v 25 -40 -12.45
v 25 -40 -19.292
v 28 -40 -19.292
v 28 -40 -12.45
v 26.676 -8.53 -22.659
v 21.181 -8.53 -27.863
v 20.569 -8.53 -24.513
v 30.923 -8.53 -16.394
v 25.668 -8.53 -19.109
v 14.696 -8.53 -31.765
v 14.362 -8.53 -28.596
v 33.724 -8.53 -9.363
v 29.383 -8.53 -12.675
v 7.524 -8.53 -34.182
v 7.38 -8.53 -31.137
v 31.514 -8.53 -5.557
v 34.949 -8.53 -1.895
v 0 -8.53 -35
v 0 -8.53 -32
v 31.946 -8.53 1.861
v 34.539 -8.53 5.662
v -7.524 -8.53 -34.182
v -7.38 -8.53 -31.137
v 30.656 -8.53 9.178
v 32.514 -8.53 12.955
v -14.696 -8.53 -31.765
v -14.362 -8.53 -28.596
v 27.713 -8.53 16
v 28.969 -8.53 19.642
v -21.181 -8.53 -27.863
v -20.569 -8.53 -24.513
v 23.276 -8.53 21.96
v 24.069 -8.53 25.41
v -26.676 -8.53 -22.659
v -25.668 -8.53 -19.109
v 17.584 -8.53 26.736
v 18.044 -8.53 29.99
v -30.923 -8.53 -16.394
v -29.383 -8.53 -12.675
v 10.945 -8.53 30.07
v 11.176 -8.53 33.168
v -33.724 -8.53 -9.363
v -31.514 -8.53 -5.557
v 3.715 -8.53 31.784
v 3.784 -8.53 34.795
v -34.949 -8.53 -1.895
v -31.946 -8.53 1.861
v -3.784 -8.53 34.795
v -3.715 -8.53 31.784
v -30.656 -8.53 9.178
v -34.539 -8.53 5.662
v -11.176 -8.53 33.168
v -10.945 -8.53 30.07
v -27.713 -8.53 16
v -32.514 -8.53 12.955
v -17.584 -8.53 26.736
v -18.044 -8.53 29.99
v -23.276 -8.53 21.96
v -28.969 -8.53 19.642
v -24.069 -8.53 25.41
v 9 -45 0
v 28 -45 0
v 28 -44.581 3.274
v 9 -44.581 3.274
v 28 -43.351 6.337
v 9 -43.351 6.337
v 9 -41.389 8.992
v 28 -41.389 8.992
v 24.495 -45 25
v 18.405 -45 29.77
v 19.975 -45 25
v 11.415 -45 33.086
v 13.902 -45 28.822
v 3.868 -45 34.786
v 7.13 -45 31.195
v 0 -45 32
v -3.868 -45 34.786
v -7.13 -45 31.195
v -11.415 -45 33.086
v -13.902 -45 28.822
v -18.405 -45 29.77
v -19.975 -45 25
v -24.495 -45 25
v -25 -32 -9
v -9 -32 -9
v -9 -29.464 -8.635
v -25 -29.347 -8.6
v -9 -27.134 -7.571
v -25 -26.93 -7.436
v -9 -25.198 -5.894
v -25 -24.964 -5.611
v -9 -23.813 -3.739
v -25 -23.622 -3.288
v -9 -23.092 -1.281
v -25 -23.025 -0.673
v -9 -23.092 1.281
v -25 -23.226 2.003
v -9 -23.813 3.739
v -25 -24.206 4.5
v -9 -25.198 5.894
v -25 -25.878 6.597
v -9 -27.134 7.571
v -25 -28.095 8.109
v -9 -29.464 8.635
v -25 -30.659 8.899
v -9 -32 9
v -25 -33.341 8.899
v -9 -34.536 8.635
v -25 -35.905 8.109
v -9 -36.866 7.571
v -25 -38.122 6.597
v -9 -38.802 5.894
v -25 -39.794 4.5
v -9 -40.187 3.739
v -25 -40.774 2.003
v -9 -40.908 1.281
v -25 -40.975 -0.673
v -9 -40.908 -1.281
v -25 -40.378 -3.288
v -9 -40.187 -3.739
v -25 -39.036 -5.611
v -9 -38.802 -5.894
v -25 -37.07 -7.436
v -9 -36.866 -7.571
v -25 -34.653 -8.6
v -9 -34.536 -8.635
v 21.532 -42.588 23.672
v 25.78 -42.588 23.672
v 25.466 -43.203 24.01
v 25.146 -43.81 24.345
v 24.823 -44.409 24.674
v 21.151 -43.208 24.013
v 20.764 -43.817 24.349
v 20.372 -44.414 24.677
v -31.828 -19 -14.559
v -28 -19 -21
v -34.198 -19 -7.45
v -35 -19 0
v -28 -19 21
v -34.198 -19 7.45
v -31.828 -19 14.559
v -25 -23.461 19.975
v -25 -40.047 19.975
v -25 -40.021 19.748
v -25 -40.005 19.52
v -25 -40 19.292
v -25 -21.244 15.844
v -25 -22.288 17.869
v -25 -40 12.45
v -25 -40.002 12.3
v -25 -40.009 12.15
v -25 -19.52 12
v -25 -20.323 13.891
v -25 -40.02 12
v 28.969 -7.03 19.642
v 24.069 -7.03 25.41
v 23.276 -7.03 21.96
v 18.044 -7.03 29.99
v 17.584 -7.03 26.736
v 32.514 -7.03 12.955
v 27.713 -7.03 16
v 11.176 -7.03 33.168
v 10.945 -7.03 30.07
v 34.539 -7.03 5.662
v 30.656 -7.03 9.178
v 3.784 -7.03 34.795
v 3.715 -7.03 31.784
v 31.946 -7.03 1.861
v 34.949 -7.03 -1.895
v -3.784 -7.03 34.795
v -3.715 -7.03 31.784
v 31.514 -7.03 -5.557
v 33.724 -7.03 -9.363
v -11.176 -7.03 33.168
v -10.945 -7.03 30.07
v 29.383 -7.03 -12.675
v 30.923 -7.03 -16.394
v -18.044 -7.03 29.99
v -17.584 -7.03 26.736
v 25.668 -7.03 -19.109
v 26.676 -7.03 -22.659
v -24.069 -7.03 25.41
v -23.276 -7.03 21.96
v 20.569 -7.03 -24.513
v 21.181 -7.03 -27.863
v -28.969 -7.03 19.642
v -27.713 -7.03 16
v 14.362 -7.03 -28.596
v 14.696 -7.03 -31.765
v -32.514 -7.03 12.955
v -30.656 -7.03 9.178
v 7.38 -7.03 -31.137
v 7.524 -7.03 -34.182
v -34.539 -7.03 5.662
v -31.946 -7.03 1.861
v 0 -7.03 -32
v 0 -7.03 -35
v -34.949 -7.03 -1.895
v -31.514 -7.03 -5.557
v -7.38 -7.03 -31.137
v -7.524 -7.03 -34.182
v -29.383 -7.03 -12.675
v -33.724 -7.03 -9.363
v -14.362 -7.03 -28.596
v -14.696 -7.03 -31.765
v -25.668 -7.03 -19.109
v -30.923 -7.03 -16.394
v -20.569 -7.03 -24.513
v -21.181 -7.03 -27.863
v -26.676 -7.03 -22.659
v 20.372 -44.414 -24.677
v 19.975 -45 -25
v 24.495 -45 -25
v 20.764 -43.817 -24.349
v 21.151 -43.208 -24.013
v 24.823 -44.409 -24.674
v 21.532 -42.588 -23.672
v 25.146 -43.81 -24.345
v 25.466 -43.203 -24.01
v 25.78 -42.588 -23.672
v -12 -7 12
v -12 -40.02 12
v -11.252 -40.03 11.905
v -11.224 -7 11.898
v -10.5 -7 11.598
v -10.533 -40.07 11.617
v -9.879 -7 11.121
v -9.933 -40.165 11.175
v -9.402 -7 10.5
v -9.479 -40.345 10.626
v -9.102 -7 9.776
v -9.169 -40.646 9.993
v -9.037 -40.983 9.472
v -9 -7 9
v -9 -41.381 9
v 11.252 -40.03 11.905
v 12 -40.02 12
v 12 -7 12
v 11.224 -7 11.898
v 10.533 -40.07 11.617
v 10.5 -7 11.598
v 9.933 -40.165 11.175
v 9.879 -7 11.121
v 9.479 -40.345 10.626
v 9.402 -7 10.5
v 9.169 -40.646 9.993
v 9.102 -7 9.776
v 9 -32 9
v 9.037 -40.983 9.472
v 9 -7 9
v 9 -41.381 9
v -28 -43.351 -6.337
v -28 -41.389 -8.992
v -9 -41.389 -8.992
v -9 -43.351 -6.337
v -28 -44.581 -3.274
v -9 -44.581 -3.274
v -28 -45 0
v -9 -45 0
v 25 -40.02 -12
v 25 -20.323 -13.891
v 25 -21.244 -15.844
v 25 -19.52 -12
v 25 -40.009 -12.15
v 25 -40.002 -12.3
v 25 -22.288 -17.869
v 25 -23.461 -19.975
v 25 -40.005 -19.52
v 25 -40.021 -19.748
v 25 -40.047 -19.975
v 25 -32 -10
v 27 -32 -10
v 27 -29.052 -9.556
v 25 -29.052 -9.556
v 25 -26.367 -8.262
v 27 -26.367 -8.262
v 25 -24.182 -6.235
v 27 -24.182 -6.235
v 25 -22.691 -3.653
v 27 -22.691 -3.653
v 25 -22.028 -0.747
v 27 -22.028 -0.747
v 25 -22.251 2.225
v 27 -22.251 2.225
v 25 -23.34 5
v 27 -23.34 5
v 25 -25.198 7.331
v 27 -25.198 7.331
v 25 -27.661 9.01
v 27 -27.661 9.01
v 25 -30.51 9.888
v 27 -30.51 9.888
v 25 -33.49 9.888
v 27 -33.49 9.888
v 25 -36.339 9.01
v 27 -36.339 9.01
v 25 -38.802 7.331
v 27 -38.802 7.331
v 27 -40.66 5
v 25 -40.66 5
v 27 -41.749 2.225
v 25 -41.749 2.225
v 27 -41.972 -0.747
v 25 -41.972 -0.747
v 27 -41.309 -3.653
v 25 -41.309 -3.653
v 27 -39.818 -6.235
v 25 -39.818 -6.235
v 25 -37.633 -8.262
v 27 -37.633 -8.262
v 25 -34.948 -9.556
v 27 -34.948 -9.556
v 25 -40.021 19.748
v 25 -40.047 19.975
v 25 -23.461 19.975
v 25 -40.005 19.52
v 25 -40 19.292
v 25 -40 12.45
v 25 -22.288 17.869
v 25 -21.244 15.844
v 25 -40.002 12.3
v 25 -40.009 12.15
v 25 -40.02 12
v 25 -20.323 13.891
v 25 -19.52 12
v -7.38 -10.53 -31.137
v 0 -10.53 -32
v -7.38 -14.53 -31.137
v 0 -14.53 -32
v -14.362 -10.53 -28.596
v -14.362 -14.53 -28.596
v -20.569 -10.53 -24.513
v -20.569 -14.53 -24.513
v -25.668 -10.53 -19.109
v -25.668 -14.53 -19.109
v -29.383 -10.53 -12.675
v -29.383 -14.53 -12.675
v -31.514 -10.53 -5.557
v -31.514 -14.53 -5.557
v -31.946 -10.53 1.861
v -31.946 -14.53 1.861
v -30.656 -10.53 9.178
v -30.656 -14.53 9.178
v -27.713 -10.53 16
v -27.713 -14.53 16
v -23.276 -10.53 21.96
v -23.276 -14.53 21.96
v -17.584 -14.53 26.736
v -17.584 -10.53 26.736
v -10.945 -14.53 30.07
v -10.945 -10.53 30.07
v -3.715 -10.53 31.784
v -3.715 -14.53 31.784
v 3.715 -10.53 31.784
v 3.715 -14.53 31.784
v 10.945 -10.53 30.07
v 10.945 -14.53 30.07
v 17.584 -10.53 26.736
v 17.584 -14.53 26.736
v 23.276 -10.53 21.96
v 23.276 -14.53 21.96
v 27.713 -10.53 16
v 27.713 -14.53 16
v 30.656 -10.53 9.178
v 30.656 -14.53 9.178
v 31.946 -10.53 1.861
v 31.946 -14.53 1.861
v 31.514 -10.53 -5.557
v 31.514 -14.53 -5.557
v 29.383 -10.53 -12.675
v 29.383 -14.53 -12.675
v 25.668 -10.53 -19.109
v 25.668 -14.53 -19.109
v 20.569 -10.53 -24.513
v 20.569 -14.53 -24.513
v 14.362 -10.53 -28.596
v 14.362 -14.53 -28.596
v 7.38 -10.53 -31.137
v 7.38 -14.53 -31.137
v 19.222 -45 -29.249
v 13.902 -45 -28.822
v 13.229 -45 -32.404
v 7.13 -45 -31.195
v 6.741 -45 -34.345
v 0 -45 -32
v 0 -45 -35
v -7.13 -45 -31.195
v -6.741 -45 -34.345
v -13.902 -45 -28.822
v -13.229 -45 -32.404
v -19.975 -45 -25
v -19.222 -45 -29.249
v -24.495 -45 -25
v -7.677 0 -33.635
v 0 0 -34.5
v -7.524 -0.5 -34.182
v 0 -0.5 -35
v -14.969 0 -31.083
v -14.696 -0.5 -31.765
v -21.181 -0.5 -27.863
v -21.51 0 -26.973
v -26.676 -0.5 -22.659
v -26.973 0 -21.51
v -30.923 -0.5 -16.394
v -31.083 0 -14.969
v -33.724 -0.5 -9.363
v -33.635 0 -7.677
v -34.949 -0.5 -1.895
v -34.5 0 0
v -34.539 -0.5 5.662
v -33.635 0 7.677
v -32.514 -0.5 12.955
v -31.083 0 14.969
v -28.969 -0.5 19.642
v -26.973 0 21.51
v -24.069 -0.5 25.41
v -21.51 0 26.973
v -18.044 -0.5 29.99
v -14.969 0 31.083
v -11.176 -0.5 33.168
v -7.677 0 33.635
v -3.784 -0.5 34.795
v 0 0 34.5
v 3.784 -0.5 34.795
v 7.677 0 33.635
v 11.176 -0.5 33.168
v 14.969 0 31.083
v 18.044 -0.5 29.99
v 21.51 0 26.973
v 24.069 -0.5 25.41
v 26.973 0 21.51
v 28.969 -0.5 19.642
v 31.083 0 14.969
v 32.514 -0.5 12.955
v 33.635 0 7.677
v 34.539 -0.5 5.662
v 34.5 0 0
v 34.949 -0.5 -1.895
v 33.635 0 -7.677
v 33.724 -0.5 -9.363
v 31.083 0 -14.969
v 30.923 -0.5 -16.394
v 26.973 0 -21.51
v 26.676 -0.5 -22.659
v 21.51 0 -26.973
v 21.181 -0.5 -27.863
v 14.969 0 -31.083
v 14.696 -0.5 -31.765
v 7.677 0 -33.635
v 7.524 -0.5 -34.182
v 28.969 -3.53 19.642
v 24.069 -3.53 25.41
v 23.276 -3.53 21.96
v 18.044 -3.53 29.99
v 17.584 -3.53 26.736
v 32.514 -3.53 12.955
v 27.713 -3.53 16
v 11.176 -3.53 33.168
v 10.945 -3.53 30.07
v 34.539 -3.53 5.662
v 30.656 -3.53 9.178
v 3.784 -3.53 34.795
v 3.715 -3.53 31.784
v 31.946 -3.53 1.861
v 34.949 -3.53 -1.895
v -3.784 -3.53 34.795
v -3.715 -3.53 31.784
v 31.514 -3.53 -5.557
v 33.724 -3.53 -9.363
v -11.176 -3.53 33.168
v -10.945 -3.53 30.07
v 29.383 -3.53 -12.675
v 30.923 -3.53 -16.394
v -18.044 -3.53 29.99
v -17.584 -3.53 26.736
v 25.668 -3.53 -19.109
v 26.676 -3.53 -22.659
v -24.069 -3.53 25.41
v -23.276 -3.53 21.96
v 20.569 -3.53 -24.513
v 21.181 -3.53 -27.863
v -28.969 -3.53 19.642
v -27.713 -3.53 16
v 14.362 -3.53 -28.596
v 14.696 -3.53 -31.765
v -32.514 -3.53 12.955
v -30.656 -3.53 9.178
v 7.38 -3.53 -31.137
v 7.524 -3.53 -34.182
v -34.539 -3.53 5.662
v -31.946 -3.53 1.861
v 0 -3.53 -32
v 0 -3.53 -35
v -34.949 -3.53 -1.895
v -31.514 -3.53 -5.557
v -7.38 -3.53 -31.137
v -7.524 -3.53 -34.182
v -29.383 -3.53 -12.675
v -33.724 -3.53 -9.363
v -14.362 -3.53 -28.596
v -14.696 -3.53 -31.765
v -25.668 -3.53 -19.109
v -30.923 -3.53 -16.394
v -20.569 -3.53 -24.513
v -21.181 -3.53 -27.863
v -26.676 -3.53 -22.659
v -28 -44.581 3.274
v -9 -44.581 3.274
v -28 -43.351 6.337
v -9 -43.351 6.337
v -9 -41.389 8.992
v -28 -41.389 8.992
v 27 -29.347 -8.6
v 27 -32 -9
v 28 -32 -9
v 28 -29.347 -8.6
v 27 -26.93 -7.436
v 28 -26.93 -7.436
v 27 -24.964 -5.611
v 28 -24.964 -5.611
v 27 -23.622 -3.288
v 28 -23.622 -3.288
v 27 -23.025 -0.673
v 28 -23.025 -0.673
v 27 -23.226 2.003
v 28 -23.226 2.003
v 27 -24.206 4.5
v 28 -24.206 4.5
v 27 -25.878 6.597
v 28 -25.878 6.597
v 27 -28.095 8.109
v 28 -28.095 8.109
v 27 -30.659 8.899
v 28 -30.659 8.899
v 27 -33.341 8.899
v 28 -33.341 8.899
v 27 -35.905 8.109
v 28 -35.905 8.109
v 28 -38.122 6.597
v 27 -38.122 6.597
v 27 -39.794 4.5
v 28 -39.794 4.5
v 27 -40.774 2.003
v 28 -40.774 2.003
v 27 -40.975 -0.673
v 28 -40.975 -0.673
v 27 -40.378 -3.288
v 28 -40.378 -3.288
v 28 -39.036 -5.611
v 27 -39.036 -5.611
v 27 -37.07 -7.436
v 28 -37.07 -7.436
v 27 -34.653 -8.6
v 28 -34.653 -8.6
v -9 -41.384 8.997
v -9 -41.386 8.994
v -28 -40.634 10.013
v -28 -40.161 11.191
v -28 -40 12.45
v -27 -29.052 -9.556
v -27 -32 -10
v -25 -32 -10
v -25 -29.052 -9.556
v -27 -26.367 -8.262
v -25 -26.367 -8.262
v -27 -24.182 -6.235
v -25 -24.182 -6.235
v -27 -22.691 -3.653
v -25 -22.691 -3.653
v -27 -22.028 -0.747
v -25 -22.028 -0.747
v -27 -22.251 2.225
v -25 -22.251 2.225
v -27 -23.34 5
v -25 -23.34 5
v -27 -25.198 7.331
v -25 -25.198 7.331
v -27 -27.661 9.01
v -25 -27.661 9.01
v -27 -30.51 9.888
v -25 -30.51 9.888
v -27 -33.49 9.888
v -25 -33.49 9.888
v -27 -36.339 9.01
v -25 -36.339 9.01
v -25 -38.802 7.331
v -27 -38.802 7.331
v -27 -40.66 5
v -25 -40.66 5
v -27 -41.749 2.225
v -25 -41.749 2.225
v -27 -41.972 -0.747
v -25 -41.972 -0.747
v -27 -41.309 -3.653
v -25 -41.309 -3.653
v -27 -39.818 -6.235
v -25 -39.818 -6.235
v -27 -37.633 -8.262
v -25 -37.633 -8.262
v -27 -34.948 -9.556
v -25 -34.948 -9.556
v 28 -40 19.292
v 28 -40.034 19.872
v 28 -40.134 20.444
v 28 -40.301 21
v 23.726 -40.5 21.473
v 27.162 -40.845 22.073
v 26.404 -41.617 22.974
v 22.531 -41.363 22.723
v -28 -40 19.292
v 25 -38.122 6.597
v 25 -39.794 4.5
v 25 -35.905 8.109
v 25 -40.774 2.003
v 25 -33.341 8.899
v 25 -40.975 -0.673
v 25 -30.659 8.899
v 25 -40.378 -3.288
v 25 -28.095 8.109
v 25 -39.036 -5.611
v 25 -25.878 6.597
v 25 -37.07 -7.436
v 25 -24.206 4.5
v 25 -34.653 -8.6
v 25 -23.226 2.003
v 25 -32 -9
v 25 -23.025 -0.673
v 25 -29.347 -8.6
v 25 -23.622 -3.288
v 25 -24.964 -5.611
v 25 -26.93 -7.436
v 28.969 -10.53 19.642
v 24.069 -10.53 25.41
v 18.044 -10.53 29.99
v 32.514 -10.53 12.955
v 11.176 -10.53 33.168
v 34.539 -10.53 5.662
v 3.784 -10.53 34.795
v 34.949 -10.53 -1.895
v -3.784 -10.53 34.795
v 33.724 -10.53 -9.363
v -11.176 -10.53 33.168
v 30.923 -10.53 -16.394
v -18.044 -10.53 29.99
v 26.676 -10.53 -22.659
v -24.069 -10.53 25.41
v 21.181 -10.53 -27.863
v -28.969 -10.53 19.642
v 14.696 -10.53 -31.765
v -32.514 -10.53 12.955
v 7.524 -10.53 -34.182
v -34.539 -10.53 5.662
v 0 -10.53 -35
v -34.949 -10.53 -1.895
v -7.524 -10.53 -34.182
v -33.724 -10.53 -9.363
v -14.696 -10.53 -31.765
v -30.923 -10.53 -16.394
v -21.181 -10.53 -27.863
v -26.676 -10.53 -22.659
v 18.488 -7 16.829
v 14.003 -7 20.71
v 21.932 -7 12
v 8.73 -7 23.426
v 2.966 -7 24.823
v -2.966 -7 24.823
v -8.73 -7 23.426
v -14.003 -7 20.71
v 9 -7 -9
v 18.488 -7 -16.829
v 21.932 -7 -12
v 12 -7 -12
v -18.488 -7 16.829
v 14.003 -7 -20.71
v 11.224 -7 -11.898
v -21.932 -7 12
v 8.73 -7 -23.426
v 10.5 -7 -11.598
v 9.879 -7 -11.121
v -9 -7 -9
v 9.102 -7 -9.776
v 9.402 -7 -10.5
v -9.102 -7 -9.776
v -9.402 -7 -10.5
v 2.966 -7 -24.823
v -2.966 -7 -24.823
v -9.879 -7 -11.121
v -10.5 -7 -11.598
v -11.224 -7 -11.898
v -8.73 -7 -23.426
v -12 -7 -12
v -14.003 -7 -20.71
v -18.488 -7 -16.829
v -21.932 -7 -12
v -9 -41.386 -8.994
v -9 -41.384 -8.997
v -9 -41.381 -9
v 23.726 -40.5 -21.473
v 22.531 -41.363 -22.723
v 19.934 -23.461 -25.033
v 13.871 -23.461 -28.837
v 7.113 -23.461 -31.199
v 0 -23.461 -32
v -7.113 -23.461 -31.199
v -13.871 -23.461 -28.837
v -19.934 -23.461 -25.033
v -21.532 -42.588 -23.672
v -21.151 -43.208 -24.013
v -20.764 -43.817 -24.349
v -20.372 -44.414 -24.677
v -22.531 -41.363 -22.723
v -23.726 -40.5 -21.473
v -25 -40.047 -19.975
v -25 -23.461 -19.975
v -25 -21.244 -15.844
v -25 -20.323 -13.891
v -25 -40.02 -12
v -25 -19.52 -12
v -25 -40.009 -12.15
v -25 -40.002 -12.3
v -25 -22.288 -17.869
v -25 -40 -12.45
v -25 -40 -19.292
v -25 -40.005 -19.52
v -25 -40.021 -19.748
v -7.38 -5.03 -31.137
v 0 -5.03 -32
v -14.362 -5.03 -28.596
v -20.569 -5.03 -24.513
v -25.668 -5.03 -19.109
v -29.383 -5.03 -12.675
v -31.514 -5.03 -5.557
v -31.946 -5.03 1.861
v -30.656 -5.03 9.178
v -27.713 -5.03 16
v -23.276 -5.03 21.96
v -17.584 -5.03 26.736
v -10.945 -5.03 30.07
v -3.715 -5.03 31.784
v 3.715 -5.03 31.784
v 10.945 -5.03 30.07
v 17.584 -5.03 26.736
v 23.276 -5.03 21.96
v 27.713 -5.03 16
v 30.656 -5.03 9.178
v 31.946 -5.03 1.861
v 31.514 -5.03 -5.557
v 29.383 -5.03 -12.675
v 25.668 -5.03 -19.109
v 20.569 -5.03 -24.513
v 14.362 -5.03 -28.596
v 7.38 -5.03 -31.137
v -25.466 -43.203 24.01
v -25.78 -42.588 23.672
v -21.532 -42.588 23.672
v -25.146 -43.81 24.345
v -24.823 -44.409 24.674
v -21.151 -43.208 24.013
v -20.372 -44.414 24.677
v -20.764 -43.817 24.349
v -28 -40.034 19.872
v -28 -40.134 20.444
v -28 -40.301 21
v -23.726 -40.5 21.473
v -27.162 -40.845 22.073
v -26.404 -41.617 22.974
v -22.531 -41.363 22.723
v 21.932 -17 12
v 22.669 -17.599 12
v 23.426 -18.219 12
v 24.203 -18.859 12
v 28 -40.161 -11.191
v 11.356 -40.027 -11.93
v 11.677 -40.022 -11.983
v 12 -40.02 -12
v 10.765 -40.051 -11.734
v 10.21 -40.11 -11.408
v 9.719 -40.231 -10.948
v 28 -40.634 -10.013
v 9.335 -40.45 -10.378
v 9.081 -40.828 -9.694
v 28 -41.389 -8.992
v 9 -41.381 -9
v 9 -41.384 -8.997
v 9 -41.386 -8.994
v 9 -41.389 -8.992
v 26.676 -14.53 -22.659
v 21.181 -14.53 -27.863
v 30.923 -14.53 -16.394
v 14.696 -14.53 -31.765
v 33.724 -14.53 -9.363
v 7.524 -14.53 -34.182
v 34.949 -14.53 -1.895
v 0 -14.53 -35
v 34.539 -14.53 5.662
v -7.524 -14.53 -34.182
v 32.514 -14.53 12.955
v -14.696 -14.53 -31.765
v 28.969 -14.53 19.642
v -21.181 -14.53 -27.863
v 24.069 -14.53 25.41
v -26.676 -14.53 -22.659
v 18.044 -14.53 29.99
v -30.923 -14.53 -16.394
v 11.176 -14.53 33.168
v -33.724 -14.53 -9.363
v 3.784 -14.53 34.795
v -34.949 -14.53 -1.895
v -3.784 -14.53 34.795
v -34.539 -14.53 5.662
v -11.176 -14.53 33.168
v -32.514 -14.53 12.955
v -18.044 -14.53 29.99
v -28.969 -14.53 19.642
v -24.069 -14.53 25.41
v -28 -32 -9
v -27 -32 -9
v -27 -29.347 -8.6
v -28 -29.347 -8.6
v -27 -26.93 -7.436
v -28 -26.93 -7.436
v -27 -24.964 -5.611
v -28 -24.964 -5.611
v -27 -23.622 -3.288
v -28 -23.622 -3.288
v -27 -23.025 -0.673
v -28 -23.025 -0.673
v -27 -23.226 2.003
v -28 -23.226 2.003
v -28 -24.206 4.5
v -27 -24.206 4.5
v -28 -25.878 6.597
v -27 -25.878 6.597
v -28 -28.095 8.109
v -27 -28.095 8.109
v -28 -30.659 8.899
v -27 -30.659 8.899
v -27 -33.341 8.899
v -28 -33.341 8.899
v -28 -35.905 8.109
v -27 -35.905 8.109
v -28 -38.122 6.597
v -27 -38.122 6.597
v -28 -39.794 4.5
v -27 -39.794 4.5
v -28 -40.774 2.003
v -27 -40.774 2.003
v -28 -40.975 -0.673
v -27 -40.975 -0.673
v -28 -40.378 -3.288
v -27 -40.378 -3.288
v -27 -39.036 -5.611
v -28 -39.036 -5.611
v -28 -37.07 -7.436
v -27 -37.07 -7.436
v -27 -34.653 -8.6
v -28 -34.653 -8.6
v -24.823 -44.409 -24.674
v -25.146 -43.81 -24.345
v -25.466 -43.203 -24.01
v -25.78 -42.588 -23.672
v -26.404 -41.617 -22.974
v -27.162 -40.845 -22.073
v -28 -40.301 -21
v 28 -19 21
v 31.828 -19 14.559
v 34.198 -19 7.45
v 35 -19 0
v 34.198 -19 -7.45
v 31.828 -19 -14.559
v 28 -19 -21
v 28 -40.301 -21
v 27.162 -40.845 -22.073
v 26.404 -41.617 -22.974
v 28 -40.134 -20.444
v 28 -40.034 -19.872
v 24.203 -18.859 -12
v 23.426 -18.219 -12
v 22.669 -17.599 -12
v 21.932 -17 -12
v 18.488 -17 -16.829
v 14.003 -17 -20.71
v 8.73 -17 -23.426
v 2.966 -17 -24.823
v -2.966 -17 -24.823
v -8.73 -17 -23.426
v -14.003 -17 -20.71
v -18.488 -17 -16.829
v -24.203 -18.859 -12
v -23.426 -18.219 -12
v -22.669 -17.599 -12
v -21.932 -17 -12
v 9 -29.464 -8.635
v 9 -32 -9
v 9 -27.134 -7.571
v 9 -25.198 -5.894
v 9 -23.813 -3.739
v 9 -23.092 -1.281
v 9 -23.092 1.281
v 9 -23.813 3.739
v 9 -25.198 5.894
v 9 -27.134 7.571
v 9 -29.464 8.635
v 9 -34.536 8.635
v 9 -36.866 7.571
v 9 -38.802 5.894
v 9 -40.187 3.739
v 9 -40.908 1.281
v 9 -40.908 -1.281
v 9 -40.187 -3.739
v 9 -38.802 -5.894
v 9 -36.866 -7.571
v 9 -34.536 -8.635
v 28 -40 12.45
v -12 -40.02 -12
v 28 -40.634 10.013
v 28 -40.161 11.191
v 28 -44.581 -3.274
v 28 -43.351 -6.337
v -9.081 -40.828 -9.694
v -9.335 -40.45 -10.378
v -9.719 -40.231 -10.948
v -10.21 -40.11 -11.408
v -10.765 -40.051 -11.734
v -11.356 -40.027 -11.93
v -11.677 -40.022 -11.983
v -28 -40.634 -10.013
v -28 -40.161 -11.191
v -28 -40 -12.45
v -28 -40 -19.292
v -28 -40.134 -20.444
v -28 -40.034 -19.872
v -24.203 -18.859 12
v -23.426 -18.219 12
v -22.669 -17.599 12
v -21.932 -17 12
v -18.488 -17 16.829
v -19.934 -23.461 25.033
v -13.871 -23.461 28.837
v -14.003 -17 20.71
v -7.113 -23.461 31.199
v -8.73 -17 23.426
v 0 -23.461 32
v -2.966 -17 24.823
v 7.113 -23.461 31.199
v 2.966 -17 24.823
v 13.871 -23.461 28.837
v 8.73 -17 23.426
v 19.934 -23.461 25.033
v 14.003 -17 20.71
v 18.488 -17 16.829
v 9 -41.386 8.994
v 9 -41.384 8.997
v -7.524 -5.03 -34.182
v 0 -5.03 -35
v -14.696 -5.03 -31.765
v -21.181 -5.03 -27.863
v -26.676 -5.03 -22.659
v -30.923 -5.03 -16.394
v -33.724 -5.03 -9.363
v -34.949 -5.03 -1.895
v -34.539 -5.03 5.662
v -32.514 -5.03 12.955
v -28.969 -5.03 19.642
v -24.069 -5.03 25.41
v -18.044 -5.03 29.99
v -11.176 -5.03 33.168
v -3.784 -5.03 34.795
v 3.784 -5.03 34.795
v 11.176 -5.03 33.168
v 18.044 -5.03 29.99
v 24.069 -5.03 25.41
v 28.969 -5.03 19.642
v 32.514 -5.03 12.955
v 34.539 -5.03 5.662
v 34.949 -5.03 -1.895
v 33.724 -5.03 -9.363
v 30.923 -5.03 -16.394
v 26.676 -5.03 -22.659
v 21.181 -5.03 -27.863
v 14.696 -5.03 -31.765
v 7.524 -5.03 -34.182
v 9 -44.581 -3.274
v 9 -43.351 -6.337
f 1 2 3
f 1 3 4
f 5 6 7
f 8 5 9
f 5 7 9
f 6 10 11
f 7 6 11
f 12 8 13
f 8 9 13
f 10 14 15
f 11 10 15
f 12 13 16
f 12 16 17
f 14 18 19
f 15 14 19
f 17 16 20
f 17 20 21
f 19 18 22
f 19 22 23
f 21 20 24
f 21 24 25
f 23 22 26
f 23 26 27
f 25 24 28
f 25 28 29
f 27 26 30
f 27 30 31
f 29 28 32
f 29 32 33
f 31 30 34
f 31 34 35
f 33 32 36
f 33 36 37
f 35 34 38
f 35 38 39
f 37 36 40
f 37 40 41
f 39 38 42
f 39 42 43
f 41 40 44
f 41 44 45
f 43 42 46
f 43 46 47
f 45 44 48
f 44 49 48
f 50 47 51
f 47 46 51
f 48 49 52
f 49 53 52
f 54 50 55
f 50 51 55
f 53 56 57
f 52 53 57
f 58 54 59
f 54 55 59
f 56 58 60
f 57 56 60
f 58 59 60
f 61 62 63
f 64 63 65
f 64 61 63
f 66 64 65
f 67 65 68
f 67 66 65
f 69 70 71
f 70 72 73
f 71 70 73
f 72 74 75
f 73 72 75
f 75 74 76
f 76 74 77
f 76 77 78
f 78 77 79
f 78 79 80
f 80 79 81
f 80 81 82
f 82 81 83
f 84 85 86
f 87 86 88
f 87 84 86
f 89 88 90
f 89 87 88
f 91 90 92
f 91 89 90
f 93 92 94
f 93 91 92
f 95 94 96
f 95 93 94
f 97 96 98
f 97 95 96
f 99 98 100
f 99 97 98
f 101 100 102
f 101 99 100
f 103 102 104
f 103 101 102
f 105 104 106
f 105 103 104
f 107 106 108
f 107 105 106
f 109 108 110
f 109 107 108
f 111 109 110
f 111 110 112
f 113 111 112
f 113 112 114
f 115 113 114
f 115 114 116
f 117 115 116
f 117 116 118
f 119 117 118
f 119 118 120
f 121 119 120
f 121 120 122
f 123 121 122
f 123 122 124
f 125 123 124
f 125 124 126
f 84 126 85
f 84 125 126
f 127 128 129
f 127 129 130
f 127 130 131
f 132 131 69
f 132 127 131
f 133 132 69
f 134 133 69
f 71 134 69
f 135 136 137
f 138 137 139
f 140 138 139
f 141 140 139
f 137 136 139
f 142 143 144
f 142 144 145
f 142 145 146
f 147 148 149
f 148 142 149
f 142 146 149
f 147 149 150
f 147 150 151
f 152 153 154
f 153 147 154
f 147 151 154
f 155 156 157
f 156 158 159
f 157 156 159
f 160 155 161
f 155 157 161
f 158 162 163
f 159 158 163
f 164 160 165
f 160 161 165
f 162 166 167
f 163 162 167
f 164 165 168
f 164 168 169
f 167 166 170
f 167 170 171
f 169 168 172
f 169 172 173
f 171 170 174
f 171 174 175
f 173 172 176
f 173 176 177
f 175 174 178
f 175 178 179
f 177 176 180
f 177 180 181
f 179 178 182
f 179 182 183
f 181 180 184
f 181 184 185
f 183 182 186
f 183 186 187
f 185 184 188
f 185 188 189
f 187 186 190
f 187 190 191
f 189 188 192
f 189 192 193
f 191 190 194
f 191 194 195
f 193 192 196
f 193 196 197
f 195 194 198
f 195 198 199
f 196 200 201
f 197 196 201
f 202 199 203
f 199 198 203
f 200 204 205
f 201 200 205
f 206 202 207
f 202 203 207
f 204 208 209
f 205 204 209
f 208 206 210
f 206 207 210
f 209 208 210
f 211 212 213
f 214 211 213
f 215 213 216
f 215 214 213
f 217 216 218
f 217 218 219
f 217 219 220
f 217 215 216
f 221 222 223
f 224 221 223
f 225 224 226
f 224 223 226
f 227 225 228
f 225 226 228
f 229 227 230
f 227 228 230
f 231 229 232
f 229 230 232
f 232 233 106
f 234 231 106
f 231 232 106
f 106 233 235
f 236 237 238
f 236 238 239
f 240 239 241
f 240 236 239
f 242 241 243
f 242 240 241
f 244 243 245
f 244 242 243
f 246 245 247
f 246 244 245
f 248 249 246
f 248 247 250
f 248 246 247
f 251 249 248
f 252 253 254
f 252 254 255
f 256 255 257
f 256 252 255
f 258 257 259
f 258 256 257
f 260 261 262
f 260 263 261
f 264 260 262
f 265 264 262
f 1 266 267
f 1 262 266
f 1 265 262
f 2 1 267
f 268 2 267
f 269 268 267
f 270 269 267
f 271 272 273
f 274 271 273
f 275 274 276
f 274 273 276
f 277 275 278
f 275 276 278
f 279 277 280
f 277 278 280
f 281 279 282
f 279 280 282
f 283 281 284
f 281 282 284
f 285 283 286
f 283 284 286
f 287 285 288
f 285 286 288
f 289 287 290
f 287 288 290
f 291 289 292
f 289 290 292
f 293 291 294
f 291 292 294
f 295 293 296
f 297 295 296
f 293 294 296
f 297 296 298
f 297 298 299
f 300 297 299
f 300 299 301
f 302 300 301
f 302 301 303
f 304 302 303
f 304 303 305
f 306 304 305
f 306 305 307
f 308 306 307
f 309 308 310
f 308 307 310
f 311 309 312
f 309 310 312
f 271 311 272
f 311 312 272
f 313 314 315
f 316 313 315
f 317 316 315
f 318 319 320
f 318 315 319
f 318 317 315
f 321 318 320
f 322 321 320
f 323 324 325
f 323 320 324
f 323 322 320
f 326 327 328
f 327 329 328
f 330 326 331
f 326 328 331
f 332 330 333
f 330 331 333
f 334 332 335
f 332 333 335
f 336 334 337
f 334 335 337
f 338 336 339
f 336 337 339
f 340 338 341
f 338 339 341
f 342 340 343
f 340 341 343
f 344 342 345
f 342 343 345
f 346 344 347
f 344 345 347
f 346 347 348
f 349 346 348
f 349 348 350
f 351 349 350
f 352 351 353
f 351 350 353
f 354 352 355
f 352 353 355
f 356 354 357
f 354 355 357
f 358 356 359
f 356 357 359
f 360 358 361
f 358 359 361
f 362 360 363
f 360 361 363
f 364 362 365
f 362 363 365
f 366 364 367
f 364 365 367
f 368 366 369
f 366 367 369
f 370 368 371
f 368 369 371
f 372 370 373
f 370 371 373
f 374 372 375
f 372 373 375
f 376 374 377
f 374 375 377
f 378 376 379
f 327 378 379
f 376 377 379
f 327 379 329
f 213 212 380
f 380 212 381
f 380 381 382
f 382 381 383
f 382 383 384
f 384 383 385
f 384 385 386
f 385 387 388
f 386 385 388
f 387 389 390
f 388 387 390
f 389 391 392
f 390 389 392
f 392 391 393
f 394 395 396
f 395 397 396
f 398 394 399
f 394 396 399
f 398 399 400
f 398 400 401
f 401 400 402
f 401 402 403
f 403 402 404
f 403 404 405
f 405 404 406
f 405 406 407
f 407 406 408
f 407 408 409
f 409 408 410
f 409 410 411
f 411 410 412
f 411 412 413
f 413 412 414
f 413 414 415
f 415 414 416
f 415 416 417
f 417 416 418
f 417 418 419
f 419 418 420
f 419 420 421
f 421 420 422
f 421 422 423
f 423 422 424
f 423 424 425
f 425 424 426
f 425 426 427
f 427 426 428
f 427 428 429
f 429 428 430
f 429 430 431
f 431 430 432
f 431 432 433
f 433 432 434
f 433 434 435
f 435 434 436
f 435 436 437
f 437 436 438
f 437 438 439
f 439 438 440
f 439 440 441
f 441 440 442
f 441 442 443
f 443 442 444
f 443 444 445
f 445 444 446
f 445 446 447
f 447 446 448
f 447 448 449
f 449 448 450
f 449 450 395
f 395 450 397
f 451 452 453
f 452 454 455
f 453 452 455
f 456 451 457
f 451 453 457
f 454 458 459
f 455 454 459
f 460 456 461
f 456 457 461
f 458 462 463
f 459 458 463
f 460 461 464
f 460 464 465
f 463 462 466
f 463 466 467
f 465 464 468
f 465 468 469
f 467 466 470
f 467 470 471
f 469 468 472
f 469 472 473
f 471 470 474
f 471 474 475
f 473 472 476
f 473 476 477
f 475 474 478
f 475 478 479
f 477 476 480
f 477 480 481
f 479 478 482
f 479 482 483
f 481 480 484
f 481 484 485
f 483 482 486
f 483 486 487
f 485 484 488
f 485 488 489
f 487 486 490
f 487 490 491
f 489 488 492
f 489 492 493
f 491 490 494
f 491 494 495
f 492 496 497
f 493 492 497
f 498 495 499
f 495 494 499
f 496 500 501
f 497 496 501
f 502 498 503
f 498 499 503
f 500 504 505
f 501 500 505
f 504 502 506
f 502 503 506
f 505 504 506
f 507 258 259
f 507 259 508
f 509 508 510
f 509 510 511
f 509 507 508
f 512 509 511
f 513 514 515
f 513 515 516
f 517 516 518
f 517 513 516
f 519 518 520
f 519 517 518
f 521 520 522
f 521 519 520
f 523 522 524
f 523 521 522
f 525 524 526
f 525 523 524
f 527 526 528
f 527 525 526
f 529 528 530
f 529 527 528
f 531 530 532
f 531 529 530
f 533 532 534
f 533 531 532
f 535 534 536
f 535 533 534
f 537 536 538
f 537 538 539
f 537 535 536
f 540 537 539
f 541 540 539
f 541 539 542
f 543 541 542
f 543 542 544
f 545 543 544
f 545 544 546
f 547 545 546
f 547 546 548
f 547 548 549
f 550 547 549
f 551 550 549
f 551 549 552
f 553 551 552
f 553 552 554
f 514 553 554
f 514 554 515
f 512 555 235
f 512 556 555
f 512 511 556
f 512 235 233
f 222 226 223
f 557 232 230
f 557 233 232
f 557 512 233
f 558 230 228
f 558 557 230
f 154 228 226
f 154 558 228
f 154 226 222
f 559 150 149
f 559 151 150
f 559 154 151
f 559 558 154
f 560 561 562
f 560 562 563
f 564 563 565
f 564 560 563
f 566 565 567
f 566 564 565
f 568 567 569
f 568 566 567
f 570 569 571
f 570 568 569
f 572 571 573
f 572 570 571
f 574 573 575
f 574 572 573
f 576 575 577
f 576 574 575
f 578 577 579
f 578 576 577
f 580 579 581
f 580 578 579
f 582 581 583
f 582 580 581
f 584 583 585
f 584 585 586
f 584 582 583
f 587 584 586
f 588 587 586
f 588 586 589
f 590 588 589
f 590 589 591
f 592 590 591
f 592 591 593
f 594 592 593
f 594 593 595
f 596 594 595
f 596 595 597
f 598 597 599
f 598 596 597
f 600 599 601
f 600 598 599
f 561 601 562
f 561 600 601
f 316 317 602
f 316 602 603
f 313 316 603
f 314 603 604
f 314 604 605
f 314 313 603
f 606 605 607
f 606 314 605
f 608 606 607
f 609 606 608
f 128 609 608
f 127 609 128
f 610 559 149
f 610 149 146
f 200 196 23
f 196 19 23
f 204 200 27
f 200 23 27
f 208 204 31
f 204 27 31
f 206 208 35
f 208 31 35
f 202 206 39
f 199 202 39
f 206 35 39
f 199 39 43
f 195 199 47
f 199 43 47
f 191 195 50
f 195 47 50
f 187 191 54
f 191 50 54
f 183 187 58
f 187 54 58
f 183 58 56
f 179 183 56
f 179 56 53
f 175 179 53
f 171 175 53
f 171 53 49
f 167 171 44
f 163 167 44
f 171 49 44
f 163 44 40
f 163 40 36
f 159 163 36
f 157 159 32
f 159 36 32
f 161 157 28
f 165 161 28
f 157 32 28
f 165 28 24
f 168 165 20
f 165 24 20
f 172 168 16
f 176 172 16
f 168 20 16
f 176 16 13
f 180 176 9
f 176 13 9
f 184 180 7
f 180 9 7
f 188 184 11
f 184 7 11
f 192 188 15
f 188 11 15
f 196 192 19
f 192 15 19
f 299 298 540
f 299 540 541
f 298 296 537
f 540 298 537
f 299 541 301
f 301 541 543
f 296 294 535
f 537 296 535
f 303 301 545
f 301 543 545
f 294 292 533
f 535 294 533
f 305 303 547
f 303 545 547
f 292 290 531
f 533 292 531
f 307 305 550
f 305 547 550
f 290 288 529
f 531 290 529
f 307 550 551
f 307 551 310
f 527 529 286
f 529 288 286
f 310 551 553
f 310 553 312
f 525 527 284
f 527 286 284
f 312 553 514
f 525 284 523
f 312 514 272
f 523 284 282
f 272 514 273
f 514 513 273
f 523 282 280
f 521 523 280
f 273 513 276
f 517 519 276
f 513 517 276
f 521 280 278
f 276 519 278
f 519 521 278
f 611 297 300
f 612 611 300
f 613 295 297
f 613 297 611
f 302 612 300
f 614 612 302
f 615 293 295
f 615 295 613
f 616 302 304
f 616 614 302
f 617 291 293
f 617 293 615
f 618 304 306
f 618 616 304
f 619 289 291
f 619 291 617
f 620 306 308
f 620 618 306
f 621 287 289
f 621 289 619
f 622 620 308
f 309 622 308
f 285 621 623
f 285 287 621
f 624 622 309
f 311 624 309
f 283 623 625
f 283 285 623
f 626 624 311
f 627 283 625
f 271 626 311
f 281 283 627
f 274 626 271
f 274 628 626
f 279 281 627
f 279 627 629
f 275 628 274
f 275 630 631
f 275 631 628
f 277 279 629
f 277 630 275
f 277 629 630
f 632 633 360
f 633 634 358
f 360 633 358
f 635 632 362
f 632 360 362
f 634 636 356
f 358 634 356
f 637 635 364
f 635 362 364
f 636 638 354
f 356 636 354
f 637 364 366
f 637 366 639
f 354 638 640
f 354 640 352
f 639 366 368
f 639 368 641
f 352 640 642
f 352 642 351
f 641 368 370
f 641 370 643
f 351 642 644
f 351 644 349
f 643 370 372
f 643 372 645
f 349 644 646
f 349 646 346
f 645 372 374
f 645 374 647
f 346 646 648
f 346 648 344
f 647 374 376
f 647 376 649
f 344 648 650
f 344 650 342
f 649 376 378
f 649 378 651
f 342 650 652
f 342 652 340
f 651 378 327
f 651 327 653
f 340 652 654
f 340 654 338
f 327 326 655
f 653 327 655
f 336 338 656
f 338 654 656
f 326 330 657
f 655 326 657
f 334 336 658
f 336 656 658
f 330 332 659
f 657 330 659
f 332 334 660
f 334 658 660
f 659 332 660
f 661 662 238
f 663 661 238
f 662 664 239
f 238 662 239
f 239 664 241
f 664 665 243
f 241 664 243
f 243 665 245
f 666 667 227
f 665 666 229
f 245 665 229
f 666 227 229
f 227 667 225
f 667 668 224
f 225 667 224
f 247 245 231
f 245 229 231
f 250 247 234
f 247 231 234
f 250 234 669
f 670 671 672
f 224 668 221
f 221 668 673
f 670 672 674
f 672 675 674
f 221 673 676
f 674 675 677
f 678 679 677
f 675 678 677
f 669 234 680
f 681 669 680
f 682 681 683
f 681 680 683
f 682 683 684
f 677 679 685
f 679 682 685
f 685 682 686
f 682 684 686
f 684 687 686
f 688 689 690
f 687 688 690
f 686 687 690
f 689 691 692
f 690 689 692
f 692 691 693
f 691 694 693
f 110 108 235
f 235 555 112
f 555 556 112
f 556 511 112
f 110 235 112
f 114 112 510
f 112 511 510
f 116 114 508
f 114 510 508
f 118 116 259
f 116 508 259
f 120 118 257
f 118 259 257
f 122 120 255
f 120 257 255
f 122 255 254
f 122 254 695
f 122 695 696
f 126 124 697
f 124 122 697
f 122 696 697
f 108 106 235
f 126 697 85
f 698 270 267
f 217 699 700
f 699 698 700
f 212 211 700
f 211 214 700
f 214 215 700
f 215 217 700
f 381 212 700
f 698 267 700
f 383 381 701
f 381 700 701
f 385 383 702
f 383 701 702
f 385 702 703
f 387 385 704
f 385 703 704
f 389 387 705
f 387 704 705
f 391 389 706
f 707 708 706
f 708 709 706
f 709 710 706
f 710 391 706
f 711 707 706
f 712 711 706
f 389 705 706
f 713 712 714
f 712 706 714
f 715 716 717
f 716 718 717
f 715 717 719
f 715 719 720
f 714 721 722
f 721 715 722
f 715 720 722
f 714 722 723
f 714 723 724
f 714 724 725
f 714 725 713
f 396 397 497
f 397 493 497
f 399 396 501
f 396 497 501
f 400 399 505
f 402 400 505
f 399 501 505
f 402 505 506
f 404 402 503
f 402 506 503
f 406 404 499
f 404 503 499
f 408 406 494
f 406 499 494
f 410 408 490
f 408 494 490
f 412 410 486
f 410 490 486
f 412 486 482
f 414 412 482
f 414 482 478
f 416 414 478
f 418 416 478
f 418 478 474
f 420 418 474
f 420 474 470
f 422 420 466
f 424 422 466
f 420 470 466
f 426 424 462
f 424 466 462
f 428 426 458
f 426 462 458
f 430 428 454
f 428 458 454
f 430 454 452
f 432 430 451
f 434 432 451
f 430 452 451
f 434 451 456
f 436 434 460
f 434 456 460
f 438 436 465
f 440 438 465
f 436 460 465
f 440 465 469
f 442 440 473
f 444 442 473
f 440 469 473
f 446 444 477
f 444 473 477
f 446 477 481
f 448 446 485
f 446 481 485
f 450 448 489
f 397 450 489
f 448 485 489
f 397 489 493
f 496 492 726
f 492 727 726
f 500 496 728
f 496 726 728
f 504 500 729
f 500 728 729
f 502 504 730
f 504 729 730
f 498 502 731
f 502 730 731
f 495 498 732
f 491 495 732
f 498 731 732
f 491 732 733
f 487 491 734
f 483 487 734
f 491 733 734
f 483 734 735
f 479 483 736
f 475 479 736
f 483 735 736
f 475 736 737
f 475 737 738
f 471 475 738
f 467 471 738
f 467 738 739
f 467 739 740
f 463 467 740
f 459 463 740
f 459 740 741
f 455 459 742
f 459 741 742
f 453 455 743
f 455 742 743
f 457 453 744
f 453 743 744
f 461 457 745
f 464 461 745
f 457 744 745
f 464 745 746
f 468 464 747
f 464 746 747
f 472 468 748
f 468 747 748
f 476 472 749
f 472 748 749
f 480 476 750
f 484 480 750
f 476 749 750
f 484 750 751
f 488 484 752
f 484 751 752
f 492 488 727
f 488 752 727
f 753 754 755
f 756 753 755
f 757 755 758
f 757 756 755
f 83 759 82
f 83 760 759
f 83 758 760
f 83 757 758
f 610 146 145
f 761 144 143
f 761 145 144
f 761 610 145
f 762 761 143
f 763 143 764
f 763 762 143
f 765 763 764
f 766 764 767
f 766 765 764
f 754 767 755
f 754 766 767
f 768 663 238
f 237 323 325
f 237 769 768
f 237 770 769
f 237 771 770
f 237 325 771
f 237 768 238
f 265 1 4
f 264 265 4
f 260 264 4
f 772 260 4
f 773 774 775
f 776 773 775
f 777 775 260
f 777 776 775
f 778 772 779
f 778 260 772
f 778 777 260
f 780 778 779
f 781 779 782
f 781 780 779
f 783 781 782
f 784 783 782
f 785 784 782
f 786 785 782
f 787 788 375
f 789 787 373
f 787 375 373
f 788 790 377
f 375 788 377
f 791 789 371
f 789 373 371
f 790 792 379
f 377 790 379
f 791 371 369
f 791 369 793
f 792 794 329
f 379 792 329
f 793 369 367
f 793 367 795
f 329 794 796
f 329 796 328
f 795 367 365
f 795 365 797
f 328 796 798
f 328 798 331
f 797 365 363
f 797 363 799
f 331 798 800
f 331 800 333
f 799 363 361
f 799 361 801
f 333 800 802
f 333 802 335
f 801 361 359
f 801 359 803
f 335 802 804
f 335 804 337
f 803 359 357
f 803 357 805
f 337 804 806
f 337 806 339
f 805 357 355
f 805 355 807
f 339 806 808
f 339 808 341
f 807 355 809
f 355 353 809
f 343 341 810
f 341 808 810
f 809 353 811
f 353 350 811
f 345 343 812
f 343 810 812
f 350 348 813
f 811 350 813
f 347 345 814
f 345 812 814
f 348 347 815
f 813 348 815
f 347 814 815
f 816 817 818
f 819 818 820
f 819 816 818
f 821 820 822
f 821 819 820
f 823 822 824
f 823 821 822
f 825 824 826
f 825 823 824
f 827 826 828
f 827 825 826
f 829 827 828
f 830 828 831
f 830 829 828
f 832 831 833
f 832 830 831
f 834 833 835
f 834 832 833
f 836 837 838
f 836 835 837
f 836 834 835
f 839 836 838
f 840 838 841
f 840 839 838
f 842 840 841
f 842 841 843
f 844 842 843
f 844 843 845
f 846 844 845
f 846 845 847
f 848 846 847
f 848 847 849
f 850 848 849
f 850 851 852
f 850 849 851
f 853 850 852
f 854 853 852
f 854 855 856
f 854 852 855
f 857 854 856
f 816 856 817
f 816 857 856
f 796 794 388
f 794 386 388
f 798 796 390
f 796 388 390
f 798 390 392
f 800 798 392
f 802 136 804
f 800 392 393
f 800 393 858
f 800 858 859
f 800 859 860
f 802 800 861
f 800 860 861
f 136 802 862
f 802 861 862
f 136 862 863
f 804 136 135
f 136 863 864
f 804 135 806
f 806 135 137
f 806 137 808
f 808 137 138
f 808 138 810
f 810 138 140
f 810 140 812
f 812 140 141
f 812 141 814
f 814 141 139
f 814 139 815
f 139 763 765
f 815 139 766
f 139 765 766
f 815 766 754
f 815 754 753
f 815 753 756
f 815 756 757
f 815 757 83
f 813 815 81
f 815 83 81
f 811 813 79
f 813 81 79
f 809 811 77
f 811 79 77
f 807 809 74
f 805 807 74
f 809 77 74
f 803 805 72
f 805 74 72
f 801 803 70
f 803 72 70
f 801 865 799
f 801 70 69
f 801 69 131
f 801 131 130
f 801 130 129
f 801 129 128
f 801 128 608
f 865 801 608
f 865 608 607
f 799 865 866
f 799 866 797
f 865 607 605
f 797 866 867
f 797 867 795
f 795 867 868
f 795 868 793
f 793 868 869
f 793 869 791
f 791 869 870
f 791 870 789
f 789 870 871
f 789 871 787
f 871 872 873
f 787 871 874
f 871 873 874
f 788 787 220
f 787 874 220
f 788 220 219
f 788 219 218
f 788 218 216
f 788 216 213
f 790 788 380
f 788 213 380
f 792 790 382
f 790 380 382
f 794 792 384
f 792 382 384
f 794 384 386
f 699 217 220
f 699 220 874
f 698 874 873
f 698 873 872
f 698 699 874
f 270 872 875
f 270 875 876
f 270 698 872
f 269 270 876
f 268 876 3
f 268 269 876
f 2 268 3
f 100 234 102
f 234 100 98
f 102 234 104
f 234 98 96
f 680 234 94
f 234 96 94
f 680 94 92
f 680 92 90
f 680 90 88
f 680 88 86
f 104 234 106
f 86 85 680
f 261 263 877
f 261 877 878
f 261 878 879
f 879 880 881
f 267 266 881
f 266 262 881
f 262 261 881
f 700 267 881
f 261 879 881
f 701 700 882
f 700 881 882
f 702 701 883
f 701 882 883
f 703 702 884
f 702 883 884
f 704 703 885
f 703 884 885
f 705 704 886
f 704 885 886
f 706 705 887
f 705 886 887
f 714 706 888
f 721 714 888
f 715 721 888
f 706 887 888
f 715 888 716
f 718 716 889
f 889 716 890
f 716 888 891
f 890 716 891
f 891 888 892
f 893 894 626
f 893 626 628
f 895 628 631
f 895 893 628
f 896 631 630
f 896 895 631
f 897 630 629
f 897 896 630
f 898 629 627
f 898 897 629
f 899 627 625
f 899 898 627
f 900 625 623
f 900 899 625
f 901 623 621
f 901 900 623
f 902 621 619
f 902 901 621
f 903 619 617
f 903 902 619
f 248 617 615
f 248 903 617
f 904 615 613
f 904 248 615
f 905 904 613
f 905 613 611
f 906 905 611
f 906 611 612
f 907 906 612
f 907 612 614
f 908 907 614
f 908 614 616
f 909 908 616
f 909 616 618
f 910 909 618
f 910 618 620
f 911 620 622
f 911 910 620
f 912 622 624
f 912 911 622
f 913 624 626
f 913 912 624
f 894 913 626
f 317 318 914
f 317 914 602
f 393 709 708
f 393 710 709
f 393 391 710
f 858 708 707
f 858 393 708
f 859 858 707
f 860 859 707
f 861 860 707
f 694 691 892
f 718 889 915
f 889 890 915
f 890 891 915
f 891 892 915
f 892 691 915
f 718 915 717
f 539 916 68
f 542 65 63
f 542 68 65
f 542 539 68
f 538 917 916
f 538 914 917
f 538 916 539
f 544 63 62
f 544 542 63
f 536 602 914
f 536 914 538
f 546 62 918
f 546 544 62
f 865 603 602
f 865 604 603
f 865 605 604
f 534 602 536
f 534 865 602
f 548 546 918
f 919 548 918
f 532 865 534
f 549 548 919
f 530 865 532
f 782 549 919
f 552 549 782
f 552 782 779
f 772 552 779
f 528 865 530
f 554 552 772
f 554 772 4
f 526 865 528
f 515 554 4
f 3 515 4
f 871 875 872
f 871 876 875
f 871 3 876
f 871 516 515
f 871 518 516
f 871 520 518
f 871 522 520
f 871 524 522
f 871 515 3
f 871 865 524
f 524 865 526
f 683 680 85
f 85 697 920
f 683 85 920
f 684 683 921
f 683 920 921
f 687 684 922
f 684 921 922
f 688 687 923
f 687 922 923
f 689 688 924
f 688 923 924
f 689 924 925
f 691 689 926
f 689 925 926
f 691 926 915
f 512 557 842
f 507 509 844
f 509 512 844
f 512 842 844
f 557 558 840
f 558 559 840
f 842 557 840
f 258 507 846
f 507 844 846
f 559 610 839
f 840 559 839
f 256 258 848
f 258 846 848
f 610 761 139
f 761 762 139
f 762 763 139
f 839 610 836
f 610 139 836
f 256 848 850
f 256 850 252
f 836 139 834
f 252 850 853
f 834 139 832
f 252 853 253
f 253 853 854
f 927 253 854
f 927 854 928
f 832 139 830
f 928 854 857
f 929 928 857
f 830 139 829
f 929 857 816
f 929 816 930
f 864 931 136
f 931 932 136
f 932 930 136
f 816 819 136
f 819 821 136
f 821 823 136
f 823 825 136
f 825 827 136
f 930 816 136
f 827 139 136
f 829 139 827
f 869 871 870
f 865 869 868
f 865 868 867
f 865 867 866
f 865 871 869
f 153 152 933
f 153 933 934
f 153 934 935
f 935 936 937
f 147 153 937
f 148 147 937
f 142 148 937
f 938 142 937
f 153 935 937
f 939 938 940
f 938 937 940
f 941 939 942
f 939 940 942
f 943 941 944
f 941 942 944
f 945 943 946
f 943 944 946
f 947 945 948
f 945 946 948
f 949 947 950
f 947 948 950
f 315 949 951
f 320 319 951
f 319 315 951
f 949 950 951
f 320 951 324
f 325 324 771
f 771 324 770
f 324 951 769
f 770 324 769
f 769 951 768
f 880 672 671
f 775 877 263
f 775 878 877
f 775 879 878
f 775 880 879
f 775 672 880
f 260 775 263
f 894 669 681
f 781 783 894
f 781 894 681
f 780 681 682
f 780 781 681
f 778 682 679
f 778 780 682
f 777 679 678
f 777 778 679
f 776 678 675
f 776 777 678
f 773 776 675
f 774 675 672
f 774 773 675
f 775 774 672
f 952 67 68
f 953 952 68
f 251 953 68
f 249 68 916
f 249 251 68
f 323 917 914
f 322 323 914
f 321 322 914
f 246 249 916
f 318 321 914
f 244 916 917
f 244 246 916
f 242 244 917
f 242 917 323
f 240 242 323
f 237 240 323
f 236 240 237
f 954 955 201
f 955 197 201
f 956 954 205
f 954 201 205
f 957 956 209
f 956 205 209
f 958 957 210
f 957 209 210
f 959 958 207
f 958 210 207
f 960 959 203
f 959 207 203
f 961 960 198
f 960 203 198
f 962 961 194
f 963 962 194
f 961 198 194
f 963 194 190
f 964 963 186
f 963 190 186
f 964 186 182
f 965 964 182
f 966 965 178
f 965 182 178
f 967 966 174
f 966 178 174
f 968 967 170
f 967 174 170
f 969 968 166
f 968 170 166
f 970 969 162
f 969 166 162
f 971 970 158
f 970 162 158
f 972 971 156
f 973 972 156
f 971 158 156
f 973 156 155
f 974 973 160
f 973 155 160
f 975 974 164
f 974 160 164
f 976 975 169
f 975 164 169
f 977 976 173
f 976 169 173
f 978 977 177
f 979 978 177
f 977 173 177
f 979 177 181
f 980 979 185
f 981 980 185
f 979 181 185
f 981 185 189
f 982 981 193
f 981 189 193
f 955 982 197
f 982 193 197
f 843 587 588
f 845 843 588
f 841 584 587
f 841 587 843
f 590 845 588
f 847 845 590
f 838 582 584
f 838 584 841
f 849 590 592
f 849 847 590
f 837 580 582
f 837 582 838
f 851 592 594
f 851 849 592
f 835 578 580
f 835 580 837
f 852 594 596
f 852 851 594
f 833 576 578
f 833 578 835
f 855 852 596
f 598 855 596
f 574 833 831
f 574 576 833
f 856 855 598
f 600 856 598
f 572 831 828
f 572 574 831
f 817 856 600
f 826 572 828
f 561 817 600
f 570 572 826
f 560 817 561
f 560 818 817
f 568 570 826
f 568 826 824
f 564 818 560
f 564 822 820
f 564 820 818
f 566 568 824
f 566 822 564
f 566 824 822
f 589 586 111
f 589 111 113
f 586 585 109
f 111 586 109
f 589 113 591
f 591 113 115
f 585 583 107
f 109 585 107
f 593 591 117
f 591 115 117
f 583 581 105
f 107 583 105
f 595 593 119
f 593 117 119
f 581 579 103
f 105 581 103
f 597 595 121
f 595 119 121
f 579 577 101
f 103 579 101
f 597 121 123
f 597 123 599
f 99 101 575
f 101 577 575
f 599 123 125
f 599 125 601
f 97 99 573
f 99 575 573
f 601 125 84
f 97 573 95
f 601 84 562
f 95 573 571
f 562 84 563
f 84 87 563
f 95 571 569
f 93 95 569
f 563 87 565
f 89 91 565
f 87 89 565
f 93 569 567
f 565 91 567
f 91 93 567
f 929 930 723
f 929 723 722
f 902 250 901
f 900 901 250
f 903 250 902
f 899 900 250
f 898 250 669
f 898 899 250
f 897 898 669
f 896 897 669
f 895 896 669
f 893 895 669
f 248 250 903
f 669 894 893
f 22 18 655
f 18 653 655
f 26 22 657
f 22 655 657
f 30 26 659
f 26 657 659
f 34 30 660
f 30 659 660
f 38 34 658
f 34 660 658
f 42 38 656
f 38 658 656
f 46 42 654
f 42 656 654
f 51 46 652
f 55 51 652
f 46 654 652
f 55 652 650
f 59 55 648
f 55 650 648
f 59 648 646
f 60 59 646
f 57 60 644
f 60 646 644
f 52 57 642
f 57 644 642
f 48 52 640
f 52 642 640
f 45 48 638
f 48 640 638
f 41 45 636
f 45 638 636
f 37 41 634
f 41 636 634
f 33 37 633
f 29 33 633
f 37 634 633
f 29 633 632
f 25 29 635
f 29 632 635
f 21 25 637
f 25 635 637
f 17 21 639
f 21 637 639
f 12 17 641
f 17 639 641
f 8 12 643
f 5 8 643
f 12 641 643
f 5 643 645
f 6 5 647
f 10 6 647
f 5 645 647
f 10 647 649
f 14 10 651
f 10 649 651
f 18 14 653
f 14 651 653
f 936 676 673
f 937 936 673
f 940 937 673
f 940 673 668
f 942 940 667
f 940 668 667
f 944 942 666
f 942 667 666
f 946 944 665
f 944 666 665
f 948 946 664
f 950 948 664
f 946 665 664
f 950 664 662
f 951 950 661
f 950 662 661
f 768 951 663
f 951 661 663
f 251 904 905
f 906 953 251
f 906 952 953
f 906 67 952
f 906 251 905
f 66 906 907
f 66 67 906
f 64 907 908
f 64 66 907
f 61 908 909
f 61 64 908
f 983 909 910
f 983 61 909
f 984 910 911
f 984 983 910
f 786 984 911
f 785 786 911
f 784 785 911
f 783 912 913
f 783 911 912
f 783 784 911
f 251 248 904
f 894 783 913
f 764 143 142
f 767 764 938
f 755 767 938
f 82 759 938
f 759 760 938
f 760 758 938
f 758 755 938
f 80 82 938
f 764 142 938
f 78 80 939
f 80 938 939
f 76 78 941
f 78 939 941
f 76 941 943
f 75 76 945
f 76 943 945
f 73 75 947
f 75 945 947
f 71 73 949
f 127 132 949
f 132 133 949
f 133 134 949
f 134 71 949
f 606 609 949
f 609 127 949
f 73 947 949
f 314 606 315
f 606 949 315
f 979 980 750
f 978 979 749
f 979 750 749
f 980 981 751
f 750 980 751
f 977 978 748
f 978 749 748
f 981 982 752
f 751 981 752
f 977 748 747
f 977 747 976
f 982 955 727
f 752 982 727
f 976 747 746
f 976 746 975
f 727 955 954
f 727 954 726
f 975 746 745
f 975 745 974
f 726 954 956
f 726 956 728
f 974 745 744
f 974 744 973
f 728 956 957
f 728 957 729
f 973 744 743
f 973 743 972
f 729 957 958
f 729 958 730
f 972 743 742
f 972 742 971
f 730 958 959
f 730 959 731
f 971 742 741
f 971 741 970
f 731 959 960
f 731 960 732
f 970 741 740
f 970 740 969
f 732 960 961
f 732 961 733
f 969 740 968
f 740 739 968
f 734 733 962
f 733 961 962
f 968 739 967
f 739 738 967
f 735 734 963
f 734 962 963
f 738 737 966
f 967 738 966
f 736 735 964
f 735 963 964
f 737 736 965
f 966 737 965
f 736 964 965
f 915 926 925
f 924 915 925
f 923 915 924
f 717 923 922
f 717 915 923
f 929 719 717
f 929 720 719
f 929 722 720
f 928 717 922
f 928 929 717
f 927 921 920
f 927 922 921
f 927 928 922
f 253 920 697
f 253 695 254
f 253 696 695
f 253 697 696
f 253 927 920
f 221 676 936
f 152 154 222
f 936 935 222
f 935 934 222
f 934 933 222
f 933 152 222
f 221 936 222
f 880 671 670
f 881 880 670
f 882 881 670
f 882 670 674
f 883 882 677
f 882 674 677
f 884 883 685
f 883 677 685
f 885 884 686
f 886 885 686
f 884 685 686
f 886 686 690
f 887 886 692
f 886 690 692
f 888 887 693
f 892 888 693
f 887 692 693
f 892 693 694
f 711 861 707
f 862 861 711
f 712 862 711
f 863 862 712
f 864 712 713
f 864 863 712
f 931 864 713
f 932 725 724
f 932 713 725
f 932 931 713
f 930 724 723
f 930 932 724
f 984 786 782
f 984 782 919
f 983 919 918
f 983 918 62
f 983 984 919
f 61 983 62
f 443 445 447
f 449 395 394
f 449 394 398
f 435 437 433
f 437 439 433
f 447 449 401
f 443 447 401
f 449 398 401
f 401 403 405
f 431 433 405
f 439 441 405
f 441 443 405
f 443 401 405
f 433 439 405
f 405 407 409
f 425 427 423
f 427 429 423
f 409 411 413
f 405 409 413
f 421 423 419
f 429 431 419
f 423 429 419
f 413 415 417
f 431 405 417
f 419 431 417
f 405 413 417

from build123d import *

# Parameters (mm, degrees)
BOSS_EXTRUDE1_REACH     = 68.895
CUT_EXTRUDE1_DEPTH      = 67.895440801
CUT_EXTRUDE1_DEPTH_BACK = 26
SKETCH4_R               = 9
CUT_EXTRUDE5_DEPTH      = 85.964698552
CUT_EXTRUDE6_START      = -1
SKETCH5_R               = 10
CUT_EXTRUDE6_DEPTH      = 2


with BuildPart() as part:
    # Sketch1 → Revolve6 (revolve)
    with BuildSketch(Plane.XY):
        Polygon((0, 0), (34.5, 0), (35, -0.5), (35, -3.530079997), (32, -3.530079997), (32, -5.030079997), (35, -5.030079997), (35, -7.030079997), (32, -7.030079997), (32, -8.530079997), (35, -8.530079997), (35, -10.530079997), (32, -10.530079997), (32, -14.530079997), (35, -14.530079997), (35, -45), (32, -45), (32, -23.460781634), (25, -17), (25, -7), (0, -7), align=None)
    revolve(axis=Axis((0, -7, 0), (0, 1, 0)))

    # Sketch2 → Boss-Extrude1 (add, up to next)
    with BuildSketch(Plane.XZ.offset(45), mode=Mode.PRIVATE) as boss_extrude1_sk1:
        with BuildLine():
            Line((-25, 19.974984355), (-25, 12))
            Line((-25, 12), (-12, 12))
            ThreePointArc((-12, 12), (-9.878679656, 11.121320344), (-9, 9))
            Line((-9, 9), (-9, -9))
            ThreePointArc((-9, -9), (-9.878679656, -11.121320344), (-12, -12))
            Line((-12, -12), (-25, -12))
            Line((-25, -12), (-25, -19.974984355))
            ThreePointArc((-25, -19.974984355), (-32, 0), (-25, 19.974984355))
        make_face()
    boss_extrude1_tool1 = extrude(boss_extrude1_sk1.sketch, amount=-BOSS_EXTRUDE1_REACH, mode=Mode.PRIVATE) - part.part
    # Sketch2 → Boss-Extrude1 (add, up to next)
    with BuildSketch(Plane.XZ.offset(45), mode=Mode.PRIVATE) as boss_extrude1_sk2:
        with BuildLine():
            Line((25, 19.974984355), (25, 12))
            Line((25, 12), (12, 12))
            ThreePointArc((12, 12), (9.878679656, 11.121320344), (9, 9))
            Line((9, 9), (9, -9))
            ThreePointArc((9, -9), (9.878679656, -11.121320344), (12, -12))
            Line((12, -12), (25, -12))
            Line((25, -12), (25, -19.974984355))
            ThreePointArc((25, -19.974984355), (32, 0), (25, 19.974984355))
        make_face()
    boss_extrude1_tool2 = extrude(boss_extrude1_sk2.sketch, amount=-BOSS_EXTRUDE1_REACH, mode=Mode.PRIVATE) - part.part
    add(boss_extrude1_tool1.solids().sort_by_distance((-20.669877, -45, 0))[0])
    add(boss_extrude1_tool2.solids().sort_by_distance((20.669877, -45, 0))[0])

    # Sketch3 → Cut-Extrude1 (cut, two sides: drawn at the far end of the back side and taken through both)
    with BuildSketch(Plane.XZ.offset(45).offset(-CUT_EXTRUDE1_DEPTH_BACK)):
        with BuildLine():
            Line((-28, 21), (-28, -21))
            ThreePointArc((-28, -21), (-35, 0), (-28, 21))
        make_face()
        with BuildLine():
            Line((28, 21), (28, -21))
            ThreePointArc((28, -21), (35, 0), (28, 21))
        make_face()
    extrude(amount=CUT_EXTRUDE1_DEPTH + CUT_EXTRUDE1_DEPTH_BACK, mode=Mode.SUBTRACT)

    # Sketch4 → Cut-Extrude5 (cut, through all)
    with BuildSketch(Plane(origin=(28, 0, 0), x_dir=(0, 0, -1), z_dir=(1, 0, 0))):
        with Locations((0, -32)):
            Circle(SKETCH4_R)
        with BuildLine():
            ThreePointArc((8.991594154, -41.388888889), (4.844813951, -44.063489453), (0, -45))
            Line((0, -45), (25, -45))
            Line((25, -45), (23.672124938, -42.588355767))
            ThreePointArc((23.672124938, -42.588355767), (21.835968082, -40.69545466), (19.292173786, -40))
            Line((19.292173786, -40), (12.449899598, -40))
            ThreePointArc((12.449899598, -40), (10.586509617, -40.360196364), (8.991594154, -41.388888889))
        make_face()
        with BuildLine():
            Line((-25, -45), (0, -45))
            ThreePointArc((0, -45), (-4.844813951, -44.063489453), (-8.991594154, -41.388888889))
            ThreePointArc((-8.991594154, -41.388888889), (-10.586509617, -40.360196364), (-12.449899598, -40))
            Line((-12.449899598, -40), (-19.292173786, -40))
            ThreePointArc((-19.292173786, -40), (-21.835968082, -40.69545466), (-23.672124938, -42.588355767))
            Line((-23.672124938, -42.588355767), (-25, -45))
        make_face()
    extrude(amount=-CUT_EXTRUDE5_DEPTH, mode=Mode.SUBTRACT)

    # Sketch5 → Cut-Extrude6 (cut)
    with BuildSketch(Plane(origin=(28, 0, 0), x_dir=(0, 0, -1), z_dir=(1, 0, 0)).offset(CUT_EXTRUDE6_START)):
        with Locations((0, -32)):
            Circle(SKETCH5_R)
    cut_extrude6 = extrude(amount=-CUT_EXTRUDE6_DEPTH, mode=Mode.SUBTRACT)

    # Mirror1: Cut-Extrude6 across plane
    add(cut_extrude6.mirror(Plane(origin=(0, 0, 0), x_dir=(0, 0, 1), z_dir=(1, 0, 0))), mode=Mode.SUBTRACT)


solid = part.part
